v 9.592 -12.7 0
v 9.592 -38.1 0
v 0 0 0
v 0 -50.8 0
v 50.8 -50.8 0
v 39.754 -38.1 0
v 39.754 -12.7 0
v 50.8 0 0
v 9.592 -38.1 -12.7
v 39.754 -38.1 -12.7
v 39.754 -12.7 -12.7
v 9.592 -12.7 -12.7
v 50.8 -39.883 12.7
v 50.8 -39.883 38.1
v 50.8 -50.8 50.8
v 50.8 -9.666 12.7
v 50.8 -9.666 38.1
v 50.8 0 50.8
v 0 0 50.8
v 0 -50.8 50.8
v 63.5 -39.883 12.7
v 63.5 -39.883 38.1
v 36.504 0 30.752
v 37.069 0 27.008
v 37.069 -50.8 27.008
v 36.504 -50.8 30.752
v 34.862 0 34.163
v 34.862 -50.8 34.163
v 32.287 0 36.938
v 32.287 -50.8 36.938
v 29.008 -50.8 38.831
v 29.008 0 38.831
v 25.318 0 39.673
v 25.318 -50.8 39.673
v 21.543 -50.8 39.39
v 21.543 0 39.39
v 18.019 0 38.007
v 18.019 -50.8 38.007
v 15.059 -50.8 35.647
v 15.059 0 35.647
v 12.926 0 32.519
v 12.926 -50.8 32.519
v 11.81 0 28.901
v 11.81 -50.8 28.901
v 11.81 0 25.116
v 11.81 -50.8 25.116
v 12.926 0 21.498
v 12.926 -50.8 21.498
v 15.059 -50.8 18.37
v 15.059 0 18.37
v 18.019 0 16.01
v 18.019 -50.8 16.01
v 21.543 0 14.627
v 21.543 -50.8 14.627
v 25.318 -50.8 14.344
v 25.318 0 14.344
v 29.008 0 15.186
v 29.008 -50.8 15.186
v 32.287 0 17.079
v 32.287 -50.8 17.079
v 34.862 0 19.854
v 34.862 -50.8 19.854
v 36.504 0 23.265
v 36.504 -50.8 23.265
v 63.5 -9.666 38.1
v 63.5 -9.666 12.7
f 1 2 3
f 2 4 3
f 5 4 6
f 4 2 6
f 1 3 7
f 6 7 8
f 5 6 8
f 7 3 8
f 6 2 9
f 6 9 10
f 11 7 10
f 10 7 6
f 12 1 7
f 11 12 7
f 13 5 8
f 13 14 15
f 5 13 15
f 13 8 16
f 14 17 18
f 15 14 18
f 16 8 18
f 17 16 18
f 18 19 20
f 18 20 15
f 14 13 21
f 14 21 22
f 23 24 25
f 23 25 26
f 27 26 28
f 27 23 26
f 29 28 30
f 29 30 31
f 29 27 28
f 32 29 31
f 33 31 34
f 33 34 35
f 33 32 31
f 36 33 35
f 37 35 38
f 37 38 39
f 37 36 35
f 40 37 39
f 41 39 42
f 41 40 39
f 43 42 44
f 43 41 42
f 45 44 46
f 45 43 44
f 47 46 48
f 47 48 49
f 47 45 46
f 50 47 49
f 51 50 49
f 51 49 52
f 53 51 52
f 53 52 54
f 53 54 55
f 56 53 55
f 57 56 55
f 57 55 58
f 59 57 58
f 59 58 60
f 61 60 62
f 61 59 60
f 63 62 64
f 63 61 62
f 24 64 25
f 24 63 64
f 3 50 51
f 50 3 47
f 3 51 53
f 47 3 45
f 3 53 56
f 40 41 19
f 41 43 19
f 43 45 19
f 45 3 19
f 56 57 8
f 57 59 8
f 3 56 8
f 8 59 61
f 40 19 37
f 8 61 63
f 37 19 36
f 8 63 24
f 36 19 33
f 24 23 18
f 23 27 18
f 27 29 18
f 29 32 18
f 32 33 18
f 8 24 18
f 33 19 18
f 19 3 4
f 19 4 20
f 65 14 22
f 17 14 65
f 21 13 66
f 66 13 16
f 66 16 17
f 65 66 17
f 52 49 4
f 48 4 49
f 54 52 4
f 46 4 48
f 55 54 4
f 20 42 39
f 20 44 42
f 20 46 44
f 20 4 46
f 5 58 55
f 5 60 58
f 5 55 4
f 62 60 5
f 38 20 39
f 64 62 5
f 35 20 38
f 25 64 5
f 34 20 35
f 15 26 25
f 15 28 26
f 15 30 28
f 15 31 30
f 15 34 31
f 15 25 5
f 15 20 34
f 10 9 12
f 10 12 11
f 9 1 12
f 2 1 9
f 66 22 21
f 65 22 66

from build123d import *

# Parameters (mm, degrees)
F1_W     = 50.8
F1_H     = 50.8
F1_R     = 12.7
F2_DEPTH = 50.8
F3_W     = 30.162047
F3_H     = 25.4
F4_DEPTH = 12.7
F5_W     = 30.217611
F5_H     = 25.4
F6_DEPTH = 12.7


with BuildPart() as f2:
    # F1 (on face) → F2 (new body)
    with BuildSketch(Plane.XZ):
        with Locations((25.4, 25.4)):
            Rectangle(F1_W, F1_H)
        with Locations((24.368526, 27.008452)):
            Circle(F1_R, mode=Mode.SUBTRACT)
    extrude(amount=F2_DEPTH)

    # F3 (on face) → F4 (join)
    with BuildSketch(Plane(origin=(0, 0, 0), x_dir=(1, 0, 0), z_dir=(0, 0, -1))):
        with Locations((24.673132, 25.4)):
            Rectangle(F3_W, F3_H)
    extrude(amount=F4_DEPTH)

    # F5 (on face) → F6 (join)
    with BuildSketch(Plane.YZ.offset(50.8)):
        with Locations((-24.774669, 25.4)):
            Rectangle(F5_W, F5_H)
    extrude(amount=F6_DEPTH)


solid = f2.part
